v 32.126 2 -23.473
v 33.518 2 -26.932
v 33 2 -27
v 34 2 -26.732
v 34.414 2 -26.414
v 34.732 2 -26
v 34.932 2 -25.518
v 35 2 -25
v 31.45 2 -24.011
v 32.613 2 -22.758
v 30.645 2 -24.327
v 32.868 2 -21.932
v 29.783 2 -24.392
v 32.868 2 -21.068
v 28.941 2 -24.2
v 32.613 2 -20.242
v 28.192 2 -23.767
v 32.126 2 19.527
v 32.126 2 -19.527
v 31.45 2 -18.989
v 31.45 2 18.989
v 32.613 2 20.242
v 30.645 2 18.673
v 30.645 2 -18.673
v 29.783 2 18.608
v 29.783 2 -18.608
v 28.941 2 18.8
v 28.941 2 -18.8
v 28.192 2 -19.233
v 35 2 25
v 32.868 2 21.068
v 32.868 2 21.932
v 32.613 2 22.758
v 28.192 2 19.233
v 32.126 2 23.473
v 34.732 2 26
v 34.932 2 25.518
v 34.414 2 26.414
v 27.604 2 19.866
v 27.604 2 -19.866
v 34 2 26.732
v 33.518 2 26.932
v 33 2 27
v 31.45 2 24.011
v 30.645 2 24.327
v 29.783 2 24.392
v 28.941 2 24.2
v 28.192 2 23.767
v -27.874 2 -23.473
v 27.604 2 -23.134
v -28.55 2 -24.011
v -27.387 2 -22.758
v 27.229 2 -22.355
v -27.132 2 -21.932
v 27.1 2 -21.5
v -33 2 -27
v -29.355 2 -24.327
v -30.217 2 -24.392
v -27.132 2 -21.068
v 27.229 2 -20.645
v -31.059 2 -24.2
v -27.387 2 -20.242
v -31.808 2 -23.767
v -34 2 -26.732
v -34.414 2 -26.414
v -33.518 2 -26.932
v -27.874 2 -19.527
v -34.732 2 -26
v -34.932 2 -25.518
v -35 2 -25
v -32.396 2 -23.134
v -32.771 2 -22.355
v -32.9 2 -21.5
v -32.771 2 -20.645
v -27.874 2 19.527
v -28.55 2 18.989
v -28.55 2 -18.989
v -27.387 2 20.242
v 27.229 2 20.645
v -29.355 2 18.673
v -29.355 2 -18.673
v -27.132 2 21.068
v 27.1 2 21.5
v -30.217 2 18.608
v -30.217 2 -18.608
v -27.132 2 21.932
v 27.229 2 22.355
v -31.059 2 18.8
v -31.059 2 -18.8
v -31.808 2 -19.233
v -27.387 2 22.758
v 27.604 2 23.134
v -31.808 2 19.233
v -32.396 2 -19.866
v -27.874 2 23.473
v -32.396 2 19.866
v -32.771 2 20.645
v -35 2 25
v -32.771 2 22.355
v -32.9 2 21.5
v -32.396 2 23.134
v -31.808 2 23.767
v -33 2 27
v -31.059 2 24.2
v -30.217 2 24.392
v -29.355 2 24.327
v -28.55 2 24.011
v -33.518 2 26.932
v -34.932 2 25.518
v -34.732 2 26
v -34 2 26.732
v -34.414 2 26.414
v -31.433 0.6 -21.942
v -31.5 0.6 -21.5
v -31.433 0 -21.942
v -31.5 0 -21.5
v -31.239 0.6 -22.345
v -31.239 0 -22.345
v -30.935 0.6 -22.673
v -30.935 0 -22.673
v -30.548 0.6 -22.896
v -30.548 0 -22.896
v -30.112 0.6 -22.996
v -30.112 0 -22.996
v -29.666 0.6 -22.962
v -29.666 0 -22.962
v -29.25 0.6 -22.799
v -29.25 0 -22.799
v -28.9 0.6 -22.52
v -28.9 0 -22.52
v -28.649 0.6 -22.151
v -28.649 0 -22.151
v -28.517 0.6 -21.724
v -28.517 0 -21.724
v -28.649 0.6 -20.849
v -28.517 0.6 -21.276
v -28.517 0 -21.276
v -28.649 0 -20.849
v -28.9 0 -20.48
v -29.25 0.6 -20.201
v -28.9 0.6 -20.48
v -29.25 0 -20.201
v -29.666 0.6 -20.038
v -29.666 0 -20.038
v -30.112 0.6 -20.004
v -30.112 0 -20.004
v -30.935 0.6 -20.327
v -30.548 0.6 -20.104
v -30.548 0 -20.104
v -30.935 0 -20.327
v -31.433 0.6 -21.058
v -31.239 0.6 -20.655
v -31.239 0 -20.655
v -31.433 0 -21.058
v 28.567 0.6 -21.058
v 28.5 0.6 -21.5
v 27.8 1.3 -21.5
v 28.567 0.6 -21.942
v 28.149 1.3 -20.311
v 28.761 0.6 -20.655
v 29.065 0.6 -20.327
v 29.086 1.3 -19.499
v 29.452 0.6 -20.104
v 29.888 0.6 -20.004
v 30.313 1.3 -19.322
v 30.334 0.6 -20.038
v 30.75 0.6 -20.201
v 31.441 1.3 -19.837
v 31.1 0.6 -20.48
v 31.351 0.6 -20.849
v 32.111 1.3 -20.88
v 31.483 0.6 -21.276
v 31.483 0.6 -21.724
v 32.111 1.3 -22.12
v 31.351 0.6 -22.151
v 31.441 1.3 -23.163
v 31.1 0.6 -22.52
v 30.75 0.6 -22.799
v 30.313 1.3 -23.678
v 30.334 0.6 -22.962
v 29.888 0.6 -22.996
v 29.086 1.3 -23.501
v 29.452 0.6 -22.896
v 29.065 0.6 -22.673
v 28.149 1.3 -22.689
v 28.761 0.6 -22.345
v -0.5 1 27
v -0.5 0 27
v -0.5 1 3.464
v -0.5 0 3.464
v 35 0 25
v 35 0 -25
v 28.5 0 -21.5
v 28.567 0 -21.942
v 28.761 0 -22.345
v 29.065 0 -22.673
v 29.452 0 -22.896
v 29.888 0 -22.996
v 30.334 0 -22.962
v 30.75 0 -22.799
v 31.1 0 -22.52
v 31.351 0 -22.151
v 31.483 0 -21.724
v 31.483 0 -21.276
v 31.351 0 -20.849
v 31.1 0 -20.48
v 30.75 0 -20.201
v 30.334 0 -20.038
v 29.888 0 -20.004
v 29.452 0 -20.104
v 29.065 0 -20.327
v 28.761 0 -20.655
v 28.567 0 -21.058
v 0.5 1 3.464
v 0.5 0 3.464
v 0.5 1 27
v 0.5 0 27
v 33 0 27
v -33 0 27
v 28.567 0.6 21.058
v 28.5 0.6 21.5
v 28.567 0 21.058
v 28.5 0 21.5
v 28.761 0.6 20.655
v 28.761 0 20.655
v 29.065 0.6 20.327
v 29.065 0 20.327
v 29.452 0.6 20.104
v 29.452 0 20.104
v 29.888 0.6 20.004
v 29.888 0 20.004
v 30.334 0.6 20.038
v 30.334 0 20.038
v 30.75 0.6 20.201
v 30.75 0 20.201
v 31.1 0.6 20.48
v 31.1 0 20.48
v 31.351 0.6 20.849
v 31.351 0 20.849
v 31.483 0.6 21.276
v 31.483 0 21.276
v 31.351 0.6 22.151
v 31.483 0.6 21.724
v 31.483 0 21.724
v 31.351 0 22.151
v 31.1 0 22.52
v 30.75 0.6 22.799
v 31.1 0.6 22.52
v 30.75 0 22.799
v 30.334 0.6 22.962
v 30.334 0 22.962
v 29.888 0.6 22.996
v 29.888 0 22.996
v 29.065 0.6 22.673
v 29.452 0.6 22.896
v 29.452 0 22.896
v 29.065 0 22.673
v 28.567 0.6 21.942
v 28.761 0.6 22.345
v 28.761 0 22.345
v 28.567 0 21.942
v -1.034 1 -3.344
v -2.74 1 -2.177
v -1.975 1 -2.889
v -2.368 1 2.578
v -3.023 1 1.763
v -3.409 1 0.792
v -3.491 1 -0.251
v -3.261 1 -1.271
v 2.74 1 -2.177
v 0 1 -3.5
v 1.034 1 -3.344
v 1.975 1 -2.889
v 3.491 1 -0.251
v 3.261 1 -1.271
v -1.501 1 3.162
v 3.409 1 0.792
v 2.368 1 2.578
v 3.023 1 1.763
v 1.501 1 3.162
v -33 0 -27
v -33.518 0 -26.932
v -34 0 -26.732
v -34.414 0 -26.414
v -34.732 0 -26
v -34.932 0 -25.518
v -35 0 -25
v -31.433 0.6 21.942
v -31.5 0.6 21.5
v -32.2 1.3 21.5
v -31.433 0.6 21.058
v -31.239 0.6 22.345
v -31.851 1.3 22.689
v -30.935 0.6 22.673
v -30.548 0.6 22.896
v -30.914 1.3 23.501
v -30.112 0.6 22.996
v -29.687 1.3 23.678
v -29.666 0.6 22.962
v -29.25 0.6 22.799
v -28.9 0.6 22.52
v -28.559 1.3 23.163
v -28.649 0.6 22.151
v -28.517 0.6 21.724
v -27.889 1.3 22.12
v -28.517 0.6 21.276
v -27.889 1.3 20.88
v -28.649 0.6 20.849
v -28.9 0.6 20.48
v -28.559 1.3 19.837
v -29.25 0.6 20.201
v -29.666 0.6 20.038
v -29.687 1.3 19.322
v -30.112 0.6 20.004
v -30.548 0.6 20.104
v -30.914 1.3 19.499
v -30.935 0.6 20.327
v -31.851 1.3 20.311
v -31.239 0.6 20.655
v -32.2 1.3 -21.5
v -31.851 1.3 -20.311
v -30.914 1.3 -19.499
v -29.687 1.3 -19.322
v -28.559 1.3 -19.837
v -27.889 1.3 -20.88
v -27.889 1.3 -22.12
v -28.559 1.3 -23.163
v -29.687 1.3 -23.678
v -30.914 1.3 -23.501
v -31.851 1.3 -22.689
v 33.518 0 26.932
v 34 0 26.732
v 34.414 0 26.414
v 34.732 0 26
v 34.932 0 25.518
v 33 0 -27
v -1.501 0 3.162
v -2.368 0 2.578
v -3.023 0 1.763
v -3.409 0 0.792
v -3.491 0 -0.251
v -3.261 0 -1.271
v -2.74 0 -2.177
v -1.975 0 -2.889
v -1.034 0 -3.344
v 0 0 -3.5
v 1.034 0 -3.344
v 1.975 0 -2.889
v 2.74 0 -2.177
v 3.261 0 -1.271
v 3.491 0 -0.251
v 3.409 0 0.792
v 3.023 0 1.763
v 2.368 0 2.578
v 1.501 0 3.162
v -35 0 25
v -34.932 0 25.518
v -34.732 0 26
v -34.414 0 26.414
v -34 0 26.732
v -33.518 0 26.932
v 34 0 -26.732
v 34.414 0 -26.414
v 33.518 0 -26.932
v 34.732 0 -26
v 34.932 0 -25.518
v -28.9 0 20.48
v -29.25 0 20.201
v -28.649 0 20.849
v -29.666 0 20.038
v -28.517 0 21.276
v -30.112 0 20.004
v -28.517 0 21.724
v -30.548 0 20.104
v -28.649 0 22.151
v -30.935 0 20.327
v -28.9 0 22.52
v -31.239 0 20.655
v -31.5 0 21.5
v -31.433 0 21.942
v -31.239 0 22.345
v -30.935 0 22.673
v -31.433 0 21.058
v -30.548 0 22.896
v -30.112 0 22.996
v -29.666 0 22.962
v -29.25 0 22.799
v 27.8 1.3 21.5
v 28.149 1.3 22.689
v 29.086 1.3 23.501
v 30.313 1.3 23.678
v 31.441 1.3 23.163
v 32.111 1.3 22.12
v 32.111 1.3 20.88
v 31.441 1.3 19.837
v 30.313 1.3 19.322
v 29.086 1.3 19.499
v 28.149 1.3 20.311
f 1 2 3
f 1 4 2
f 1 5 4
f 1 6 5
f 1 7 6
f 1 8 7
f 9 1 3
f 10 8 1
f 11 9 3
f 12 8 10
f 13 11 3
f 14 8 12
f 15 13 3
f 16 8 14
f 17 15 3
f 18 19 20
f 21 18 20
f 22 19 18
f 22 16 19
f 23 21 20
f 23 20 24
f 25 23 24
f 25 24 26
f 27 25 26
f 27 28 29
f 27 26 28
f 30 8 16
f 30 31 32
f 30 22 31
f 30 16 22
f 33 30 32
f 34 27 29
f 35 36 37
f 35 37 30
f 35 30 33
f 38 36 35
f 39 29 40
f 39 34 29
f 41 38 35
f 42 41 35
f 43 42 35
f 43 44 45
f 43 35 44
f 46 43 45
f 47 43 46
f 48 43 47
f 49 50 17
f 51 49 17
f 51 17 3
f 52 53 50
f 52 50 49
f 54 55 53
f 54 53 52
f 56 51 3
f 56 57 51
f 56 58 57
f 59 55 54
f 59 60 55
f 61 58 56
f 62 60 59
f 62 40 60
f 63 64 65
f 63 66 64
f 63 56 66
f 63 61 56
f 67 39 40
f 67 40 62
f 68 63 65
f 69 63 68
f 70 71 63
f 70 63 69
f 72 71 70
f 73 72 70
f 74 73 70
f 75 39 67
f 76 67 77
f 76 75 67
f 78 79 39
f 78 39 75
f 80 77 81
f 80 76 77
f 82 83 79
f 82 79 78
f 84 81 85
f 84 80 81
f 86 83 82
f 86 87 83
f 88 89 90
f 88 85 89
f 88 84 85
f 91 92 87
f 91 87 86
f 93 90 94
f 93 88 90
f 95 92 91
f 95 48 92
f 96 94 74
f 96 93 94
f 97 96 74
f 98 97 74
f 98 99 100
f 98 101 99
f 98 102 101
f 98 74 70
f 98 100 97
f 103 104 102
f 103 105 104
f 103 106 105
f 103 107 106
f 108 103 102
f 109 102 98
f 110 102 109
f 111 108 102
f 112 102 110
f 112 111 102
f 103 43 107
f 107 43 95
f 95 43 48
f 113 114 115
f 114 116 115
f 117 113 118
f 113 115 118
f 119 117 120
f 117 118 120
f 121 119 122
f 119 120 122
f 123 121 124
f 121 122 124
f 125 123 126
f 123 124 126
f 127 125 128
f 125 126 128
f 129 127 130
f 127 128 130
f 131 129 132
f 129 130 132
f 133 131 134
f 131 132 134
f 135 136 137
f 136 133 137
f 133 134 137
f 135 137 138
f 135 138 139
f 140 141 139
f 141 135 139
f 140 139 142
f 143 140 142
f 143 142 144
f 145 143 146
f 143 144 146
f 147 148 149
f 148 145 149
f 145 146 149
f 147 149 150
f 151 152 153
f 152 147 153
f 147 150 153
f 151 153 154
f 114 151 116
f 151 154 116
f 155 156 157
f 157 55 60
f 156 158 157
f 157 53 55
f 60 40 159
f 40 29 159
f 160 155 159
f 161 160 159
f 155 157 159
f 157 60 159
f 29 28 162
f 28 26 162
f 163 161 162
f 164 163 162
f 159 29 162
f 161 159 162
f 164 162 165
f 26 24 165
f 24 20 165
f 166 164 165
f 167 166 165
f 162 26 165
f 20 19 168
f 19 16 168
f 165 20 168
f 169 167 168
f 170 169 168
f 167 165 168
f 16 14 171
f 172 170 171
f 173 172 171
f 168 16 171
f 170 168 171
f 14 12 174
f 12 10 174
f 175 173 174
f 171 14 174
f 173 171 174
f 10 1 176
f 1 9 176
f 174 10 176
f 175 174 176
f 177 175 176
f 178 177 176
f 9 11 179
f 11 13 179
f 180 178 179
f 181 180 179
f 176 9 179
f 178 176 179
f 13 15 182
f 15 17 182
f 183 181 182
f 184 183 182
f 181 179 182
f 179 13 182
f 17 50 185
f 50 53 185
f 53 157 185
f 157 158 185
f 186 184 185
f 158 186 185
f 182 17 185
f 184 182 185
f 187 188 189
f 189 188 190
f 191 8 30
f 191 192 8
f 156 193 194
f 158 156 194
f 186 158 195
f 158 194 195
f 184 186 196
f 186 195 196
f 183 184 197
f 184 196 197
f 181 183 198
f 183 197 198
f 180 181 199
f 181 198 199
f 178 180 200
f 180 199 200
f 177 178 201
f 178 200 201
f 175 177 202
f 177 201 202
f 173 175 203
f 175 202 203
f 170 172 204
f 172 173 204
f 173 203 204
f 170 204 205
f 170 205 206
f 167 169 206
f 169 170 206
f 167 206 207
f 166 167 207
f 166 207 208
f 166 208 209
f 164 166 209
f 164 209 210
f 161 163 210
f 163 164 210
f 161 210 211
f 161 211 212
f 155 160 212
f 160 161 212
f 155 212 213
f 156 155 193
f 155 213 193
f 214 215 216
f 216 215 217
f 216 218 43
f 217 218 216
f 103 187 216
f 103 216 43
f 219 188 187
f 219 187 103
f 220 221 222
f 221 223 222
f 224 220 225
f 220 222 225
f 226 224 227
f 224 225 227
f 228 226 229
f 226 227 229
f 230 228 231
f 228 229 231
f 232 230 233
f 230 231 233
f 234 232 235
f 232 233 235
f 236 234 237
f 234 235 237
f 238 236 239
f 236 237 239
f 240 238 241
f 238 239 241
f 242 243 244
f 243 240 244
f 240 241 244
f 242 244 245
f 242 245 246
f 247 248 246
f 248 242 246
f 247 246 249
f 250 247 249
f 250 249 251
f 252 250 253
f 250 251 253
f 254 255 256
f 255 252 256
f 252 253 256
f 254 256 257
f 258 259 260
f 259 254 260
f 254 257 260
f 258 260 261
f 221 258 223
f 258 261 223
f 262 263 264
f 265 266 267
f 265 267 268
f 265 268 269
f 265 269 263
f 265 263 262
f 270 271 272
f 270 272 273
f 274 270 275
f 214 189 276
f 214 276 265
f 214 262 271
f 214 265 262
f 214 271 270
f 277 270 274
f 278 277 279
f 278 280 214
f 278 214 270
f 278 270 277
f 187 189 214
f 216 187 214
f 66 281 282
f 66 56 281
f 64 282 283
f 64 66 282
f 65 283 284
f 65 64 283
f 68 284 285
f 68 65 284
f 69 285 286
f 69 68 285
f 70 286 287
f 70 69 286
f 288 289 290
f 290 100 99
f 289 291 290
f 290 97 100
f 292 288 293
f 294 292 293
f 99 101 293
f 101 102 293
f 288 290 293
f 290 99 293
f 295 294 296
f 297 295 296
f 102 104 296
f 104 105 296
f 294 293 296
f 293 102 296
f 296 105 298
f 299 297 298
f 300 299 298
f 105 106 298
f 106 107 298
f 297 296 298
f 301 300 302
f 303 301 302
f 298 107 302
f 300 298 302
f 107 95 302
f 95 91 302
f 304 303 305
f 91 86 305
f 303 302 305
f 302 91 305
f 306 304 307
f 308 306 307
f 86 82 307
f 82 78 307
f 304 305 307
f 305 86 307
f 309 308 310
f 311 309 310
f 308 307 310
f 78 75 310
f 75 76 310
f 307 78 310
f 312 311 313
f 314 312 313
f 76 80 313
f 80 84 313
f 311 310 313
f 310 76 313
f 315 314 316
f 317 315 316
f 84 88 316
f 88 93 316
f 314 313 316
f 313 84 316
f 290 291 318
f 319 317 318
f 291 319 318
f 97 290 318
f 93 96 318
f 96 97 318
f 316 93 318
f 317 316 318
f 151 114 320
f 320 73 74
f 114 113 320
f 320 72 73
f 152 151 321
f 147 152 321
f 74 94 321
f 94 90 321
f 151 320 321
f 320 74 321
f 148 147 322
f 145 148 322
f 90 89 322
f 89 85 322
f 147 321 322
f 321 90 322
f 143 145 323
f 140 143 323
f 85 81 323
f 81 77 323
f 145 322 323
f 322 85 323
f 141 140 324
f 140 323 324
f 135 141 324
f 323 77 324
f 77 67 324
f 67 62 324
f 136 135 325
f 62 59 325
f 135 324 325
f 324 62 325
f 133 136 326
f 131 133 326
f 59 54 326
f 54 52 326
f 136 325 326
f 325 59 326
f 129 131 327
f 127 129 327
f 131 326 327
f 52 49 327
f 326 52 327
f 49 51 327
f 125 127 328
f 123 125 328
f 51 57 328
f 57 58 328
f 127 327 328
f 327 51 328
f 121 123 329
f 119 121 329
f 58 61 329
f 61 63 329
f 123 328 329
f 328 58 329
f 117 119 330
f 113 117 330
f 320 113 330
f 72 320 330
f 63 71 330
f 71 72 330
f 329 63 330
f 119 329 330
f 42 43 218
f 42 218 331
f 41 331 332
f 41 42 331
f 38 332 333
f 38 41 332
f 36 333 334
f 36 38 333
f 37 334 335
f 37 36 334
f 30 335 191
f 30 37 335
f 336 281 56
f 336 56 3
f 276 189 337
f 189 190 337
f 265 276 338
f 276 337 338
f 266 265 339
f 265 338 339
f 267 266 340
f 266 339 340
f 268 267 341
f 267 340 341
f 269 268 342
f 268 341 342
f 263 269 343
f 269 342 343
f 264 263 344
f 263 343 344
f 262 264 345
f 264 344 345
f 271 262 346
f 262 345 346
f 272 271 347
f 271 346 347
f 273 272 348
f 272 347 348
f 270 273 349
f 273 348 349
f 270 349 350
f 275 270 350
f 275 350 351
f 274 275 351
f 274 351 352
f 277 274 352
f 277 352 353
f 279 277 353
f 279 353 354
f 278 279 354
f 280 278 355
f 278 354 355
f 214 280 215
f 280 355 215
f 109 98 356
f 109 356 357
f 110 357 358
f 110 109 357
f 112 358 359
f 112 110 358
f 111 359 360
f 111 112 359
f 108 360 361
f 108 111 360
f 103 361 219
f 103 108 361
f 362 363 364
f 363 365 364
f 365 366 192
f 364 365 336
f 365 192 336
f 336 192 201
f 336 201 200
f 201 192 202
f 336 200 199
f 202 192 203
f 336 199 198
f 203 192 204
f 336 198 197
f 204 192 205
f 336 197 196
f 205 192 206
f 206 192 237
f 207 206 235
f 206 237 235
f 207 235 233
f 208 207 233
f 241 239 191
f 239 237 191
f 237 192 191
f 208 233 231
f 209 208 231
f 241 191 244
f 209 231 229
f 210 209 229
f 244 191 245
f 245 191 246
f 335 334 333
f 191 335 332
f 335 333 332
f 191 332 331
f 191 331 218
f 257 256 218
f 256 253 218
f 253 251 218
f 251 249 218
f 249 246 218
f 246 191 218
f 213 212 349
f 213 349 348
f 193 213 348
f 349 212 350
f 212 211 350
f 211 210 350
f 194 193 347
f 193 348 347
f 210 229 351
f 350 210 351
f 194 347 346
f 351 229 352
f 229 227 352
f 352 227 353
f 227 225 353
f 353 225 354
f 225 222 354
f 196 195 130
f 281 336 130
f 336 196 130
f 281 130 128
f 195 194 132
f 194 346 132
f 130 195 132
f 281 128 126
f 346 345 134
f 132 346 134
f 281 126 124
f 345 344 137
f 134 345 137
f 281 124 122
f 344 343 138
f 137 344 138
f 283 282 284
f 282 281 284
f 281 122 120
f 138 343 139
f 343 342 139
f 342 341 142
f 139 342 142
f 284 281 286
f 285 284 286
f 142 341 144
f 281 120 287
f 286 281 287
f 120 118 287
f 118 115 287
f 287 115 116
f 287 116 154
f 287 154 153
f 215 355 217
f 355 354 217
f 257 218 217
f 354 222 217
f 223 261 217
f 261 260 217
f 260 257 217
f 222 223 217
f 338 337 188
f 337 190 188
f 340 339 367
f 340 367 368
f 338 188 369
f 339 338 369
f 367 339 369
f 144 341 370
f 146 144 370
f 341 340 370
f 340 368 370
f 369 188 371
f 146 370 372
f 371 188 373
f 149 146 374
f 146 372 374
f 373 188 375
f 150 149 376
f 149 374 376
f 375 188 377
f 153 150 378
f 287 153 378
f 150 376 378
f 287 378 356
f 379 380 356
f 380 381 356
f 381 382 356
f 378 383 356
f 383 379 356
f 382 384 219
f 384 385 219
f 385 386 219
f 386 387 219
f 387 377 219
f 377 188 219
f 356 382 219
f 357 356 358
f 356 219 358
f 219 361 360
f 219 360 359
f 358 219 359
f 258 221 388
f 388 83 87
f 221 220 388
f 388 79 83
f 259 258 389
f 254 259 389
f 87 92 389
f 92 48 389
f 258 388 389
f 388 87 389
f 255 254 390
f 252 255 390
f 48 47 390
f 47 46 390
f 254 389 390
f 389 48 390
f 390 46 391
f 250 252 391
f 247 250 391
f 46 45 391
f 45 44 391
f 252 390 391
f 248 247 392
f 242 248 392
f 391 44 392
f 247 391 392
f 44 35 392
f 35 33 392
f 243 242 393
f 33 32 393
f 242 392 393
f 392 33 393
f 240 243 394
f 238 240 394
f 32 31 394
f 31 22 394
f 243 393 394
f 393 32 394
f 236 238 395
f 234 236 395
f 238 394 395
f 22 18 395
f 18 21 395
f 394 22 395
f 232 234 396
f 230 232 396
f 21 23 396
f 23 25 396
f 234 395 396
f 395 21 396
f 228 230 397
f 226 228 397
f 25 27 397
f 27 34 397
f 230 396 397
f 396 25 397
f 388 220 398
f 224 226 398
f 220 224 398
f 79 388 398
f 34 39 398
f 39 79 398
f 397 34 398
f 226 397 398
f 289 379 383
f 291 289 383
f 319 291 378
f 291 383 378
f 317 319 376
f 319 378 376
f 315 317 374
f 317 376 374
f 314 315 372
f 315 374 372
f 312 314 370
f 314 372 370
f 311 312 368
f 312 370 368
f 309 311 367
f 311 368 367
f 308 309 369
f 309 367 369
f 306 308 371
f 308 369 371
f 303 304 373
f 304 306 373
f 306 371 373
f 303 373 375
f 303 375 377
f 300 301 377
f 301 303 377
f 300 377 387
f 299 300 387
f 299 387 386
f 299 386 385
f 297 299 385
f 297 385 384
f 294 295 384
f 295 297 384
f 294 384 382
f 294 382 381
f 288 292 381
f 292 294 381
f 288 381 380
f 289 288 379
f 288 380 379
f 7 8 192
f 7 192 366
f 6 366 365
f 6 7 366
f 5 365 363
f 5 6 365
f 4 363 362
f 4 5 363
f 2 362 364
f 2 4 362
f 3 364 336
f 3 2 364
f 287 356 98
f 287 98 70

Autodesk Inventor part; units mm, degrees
ref_plane "YZ Plane" through (0, 0, 0) normal (1, 0, 0) x (0, 1, 0)
ref_plane "XZ Plane" through (0, 0, 0) normal (0, 1, 0) x (-1, 0, 0)
ref_plane "XY Plane" through (0, 0, 0) normal (0, 0, 1) x (1, 0, 0)
sketch "Sketch1" plane through (0, 0, 0) normal (0, 1, 0) x (-1, 0, 0)
  line L0 (-35, 27) -> (35, 27)
  line L1 (35, 27) -> (35, -27)
  line L2 (35, -27) -> (-35, -27)
  line L3 (-35, -27) -> (-35, 27)
  line L4 (-35, 27) -> (35, -27) construction
  line L5 (35, 27) -> (-35, -27) construction
  line L6 (30, 21.5) -> (-30, 21.5) construction
  line L7 (-30, 21.5) -> (-30, -21.5) construction
  line L8 (-30, -21.5) -> (30, -21.5) construction
  line L9 (30, -21.5) -> (30, 21.5) construction
  line L10 (30, 21.5) -> (-30, -21.5) construction
  line L11 (-30, 21.5) -> (30, -21.5) construction
  circle A0 centre (30, 21.5) radius 1.5
  circle A1 centre (30, -21.5) radius 1.5
  circle A2 centre (-30, -21.5) radius 1.5
  circle A3 centre (-30, 21.5) radius 1.5
  point P0 (0, 0)
  dimension "d0" = 70
  dimension "d1" = 54
  dimension "d2" = 43
  dimension "d3" = 60
  dimension "d4" = 3
  dimension "d5" = 3
  dimension "d6" = 3
  dimension "d7" = 3
extrude "Extrusion1" add sketch "Sketch1" along normal blind 2
fillet "Fillet1" radius 2 4 edges at (35, 1, 27) (35, 1, -27) (-35, 1, 27) (-35, 1, -27)
sketch "Sketch2" plane through (0, 0, 0) normal (0, -1, 0) x (1, 0, 0)
  circle A0 centre (0, 0) radius 3.5
  dimension "d11" = 7
extrude "Extrusion2" cut sketch "Sketch2" against normal blind 1
sketch "Sketch3" plane through (0, 0, 0) normal (0, -1, 0) x (1, 0, 0)
  line L0 (-33, 27) -> (33, 27) projected
  circle A0 centre (0, 0) radius 3.5 projected
  line L1 (0, 27) -> (0, 0)
  line L2 (0.5, 27) -> (-0.5, 27)
  line L3 (-0.5, 27) -> (-0.5, 0)
  line L4 (-0.5, 0) -> (0.5, 0)
  line L5 (0.5, 0) -> (0.5, 27)
  point P0 (-0.5, 27)
  dimension "d14" = 0.5
  dimension "d15" = 0.5
extrude "Extrusion3" cut sketch "Sketch3" against normal blind 1 contours L0 L1 A0 L3 | L0 L5 A0 L1 | A0 L1 L4 L3 | A0 L5 L4 L1
chamfer "Chamfer1" distance 1.4 angle 45 4 edges at (-28.5, 2, -21.5) (-28.5, 2, 21.5) (31.5, 2, 21.5) (31.5, 2, -21.5)
properties part number "Bed"
